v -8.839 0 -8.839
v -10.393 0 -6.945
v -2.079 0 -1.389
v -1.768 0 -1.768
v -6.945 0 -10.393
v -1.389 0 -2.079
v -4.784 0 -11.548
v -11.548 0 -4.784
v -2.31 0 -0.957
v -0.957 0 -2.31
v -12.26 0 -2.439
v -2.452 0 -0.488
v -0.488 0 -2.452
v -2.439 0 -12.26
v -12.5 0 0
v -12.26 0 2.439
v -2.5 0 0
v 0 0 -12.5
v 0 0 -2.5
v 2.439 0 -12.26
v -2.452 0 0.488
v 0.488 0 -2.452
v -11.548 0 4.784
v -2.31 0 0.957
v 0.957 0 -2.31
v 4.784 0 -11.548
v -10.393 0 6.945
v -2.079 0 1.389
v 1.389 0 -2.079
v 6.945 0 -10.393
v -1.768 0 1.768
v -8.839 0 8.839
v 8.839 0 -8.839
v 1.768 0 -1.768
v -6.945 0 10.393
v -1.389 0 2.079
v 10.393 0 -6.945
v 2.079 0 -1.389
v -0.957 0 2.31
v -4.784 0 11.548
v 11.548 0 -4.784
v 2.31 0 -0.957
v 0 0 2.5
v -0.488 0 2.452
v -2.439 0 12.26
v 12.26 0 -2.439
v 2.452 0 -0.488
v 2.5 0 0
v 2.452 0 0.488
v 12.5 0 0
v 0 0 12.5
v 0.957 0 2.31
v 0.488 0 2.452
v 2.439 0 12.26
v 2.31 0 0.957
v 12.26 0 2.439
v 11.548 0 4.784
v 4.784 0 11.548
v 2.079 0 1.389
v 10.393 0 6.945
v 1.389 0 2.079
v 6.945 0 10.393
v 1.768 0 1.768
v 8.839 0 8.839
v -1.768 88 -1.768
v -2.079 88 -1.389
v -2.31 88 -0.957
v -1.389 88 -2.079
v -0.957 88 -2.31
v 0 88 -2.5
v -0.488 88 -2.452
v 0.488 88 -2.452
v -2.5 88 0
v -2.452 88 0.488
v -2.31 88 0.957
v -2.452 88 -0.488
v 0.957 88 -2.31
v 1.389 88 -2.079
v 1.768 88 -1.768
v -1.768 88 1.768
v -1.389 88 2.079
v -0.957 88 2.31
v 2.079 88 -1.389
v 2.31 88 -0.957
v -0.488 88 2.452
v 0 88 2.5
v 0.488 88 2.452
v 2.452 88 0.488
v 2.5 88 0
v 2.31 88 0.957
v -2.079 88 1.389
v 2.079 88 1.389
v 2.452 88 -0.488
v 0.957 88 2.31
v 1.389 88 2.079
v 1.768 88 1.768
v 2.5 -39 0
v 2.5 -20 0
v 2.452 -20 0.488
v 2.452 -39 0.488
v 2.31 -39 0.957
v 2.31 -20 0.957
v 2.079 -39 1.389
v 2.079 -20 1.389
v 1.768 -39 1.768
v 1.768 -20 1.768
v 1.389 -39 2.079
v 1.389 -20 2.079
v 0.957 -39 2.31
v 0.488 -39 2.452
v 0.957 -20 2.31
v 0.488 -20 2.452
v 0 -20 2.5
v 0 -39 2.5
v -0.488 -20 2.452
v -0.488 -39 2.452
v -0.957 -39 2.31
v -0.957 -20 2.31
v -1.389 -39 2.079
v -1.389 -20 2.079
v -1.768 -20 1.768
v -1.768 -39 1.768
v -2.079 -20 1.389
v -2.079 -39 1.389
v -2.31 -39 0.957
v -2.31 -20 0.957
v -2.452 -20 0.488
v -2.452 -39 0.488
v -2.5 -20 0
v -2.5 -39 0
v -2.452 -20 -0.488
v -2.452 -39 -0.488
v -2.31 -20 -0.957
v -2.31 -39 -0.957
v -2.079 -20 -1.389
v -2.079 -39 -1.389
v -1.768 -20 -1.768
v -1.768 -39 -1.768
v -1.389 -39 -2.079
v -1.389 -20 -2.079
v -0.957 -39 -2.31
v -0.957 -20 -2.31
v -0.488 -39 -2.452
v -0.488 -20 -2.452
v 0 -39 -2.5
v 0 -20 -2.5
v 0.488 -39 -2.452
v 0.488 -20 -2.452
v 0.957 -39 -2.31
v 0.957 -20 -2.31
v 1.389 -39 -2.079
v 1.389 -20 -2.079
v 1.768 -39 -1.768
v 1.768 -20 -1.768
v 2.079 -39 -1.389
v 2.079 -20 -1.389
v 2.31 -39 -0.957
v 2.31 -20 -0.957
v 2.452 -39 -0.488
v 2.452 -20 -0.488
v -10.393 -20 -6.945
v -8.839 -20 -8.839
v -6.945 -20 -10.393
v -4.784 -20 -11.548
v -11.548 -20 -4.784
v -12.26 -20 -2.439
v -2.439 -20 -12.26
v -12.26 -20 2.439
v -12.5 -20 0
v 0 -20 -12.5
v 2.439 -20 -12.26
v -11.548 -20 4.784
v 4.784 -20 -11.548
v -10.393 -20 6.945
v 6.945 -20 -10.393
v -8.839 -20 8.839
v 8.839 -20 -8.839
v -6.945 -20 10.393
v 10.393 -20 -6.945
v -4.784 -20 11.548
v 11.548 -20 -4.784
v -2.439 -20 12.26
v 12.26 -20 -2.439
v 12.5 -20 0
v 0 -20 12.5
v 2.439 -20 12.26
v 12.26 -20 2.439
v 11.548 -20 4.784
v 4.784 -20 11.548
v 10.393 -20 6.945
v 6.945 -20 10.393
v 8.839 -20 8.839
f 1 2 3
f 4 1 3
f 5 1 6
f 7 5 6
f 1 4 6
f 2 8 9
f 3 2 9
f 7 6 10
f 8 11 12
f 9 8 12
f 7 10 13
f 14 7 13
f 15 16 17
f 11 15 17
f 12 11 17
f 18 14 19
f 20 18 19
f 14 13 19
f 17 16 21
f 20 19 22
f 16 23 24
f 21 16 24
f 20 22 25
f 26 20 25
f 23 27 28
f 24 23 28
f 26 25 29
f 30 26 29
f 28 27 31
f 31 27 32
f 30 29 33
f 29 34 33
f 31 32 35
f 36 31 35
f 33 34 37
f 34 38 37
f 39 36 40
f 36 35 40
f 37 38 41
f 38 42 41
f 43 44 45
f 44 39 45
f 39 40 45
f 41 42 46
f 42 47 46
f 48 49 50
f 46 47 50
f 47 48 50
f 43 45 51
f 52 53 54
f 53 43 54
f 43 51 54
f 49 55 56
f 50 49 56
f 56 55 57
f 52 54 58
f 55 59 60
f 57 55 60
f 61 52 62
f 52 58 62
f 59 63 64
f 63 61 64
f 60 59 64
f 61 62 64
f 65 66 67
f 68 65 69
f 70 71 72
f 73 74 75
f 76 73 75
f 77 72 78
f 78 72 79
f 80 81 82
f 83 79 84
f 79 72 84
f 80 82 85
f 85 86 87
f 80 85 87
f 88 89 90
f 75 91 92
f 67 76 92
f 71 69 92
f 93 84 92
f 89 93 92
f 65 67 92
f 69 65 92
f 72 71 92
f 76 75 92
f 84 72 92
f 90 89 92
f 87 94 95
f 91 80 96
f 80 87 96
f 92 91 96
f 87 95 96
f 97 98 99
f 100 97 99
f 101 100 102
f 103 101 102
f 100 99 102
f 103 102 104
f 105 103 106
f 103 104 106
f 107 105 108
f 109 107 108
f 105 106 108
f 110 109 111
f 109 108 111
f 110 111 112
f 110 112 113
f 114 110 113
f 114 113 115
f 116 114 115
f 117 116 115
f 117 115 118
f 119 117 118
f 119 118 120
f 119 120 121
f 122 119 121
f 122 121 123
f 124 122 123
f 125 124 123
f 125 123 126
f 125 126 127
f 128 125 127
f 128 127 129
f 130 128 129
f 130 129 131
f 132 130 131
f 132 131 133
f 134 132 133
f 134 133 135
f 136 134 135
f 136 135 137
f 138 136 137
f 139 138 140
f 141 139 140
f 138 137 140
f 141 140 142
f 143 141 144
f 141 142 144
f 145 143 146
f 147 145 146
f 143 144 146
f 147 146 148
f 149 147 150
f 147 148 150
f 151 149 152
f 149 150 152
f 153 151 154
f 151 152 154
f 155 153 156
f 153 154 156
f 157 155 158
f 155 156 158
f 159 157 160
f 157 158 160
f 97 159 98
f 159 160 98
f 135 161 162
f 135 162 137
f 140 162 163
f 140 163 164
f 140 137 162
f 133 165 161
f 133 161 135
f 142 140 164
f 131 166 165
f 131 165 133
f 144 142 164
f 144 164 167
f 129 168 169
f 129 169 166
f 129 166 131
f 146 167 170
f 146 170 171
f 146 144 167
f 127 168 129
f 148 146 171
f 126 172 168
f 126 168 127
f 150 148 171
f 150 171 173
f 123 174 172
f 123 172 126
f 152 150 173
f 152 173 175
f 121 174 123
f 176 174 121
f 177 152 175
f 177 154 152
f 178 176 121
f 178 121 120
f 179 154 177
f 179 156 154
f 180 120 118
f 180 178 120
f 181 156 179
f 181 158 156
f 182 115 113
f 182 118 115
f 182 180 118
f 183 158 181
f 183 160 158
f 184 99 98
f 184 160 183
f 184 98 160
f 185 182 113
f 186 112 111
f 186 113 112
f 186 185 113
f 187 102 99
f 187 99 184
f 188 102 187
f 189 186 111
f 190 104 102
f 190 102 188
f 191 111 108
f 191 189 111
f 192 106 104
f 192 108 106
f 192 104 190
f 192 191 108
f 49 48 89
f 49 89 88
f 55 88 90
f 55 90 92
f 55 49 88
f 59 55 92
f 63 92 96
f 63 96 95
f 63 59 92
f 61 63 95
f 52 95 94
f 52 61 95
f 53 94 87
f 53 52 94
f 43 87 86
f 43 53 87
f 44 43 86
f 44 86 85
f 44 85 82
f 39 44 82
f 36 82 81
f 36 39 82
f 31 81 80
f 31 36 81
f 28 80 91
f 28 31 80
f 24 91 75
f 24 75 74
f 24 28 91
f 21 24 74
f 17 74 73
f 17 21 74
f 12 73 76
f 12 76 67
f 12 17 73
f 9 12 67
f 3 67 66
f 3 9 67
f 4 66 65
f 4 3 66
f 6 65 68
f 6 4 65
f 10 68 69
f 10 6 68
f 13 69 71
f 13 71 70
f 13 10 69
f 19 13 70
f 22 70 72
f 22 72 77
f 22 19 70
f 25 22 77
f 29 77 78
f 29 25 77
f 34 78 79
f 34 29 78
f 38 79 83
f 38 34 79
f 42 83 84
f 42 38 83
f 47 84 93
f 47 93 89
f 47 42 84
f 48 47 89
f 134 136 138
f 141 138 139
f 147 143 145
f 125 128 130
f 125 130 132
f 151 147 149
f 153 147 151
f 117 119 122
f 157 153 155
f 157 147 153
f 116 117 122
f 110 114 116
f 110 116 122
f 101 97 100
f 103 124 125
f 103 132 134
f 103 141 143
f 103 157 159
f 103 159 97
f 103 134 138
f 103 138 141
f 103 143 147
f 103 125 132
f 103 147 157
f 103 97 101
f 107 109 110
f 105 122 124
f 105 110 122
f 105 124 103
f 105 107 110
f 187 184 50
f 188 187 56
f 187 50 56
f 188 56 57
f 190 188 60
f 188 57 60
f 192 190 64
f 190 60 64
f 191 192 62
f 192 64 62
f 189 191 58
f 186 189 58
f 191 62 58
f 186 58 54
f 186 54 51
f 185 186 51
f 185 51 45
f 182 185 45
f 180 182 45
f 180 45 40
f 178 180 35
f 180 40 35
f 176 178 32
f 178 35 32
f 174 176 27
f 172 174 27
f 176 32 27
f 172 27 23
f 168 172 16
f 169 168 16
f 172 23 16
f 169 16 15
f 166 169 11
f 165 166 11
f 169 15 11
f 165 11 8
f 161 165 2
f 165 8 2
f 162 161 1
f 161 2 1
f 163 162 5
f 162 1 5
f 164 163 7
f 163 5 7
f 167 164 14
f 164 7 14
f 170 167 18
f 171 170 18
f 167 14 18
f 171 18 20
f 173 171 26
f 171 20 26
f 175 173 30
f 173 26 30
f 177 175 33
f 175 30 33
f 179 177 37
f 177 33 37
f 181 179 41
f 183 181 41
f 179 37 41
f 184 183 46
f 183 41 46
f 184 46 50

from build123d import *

# Parameters (mm, degrees)
F0_R     = 2.5
F1_DEPTH = 39
F0_R_2   = 12.5
F2_DEPTH = 20
F3_DEPTH = 88


with BuildPart() as f1:
    # F0 (on Front) → F1 (new body)
    with BuildSketch(Plane.XZ):
        Circle(F0_R)
    extrude(amount=F1_DEPTH)

    # F0 (on Front) → F2 (join)
    with BuildSketch(Plane.XZ):
        Circle(F0_R_2)
        Circle(F0_R, mode=Mode.SUBTRACT)
    extrude(amount=F2_DEPTH)

    # F0 (on Front) → F3 (join)
    with BuildSketch(Plane.XZ):
        Circle(F0_R)
    extrude(amount=-F3_DEPTH)


solid = f1.part
